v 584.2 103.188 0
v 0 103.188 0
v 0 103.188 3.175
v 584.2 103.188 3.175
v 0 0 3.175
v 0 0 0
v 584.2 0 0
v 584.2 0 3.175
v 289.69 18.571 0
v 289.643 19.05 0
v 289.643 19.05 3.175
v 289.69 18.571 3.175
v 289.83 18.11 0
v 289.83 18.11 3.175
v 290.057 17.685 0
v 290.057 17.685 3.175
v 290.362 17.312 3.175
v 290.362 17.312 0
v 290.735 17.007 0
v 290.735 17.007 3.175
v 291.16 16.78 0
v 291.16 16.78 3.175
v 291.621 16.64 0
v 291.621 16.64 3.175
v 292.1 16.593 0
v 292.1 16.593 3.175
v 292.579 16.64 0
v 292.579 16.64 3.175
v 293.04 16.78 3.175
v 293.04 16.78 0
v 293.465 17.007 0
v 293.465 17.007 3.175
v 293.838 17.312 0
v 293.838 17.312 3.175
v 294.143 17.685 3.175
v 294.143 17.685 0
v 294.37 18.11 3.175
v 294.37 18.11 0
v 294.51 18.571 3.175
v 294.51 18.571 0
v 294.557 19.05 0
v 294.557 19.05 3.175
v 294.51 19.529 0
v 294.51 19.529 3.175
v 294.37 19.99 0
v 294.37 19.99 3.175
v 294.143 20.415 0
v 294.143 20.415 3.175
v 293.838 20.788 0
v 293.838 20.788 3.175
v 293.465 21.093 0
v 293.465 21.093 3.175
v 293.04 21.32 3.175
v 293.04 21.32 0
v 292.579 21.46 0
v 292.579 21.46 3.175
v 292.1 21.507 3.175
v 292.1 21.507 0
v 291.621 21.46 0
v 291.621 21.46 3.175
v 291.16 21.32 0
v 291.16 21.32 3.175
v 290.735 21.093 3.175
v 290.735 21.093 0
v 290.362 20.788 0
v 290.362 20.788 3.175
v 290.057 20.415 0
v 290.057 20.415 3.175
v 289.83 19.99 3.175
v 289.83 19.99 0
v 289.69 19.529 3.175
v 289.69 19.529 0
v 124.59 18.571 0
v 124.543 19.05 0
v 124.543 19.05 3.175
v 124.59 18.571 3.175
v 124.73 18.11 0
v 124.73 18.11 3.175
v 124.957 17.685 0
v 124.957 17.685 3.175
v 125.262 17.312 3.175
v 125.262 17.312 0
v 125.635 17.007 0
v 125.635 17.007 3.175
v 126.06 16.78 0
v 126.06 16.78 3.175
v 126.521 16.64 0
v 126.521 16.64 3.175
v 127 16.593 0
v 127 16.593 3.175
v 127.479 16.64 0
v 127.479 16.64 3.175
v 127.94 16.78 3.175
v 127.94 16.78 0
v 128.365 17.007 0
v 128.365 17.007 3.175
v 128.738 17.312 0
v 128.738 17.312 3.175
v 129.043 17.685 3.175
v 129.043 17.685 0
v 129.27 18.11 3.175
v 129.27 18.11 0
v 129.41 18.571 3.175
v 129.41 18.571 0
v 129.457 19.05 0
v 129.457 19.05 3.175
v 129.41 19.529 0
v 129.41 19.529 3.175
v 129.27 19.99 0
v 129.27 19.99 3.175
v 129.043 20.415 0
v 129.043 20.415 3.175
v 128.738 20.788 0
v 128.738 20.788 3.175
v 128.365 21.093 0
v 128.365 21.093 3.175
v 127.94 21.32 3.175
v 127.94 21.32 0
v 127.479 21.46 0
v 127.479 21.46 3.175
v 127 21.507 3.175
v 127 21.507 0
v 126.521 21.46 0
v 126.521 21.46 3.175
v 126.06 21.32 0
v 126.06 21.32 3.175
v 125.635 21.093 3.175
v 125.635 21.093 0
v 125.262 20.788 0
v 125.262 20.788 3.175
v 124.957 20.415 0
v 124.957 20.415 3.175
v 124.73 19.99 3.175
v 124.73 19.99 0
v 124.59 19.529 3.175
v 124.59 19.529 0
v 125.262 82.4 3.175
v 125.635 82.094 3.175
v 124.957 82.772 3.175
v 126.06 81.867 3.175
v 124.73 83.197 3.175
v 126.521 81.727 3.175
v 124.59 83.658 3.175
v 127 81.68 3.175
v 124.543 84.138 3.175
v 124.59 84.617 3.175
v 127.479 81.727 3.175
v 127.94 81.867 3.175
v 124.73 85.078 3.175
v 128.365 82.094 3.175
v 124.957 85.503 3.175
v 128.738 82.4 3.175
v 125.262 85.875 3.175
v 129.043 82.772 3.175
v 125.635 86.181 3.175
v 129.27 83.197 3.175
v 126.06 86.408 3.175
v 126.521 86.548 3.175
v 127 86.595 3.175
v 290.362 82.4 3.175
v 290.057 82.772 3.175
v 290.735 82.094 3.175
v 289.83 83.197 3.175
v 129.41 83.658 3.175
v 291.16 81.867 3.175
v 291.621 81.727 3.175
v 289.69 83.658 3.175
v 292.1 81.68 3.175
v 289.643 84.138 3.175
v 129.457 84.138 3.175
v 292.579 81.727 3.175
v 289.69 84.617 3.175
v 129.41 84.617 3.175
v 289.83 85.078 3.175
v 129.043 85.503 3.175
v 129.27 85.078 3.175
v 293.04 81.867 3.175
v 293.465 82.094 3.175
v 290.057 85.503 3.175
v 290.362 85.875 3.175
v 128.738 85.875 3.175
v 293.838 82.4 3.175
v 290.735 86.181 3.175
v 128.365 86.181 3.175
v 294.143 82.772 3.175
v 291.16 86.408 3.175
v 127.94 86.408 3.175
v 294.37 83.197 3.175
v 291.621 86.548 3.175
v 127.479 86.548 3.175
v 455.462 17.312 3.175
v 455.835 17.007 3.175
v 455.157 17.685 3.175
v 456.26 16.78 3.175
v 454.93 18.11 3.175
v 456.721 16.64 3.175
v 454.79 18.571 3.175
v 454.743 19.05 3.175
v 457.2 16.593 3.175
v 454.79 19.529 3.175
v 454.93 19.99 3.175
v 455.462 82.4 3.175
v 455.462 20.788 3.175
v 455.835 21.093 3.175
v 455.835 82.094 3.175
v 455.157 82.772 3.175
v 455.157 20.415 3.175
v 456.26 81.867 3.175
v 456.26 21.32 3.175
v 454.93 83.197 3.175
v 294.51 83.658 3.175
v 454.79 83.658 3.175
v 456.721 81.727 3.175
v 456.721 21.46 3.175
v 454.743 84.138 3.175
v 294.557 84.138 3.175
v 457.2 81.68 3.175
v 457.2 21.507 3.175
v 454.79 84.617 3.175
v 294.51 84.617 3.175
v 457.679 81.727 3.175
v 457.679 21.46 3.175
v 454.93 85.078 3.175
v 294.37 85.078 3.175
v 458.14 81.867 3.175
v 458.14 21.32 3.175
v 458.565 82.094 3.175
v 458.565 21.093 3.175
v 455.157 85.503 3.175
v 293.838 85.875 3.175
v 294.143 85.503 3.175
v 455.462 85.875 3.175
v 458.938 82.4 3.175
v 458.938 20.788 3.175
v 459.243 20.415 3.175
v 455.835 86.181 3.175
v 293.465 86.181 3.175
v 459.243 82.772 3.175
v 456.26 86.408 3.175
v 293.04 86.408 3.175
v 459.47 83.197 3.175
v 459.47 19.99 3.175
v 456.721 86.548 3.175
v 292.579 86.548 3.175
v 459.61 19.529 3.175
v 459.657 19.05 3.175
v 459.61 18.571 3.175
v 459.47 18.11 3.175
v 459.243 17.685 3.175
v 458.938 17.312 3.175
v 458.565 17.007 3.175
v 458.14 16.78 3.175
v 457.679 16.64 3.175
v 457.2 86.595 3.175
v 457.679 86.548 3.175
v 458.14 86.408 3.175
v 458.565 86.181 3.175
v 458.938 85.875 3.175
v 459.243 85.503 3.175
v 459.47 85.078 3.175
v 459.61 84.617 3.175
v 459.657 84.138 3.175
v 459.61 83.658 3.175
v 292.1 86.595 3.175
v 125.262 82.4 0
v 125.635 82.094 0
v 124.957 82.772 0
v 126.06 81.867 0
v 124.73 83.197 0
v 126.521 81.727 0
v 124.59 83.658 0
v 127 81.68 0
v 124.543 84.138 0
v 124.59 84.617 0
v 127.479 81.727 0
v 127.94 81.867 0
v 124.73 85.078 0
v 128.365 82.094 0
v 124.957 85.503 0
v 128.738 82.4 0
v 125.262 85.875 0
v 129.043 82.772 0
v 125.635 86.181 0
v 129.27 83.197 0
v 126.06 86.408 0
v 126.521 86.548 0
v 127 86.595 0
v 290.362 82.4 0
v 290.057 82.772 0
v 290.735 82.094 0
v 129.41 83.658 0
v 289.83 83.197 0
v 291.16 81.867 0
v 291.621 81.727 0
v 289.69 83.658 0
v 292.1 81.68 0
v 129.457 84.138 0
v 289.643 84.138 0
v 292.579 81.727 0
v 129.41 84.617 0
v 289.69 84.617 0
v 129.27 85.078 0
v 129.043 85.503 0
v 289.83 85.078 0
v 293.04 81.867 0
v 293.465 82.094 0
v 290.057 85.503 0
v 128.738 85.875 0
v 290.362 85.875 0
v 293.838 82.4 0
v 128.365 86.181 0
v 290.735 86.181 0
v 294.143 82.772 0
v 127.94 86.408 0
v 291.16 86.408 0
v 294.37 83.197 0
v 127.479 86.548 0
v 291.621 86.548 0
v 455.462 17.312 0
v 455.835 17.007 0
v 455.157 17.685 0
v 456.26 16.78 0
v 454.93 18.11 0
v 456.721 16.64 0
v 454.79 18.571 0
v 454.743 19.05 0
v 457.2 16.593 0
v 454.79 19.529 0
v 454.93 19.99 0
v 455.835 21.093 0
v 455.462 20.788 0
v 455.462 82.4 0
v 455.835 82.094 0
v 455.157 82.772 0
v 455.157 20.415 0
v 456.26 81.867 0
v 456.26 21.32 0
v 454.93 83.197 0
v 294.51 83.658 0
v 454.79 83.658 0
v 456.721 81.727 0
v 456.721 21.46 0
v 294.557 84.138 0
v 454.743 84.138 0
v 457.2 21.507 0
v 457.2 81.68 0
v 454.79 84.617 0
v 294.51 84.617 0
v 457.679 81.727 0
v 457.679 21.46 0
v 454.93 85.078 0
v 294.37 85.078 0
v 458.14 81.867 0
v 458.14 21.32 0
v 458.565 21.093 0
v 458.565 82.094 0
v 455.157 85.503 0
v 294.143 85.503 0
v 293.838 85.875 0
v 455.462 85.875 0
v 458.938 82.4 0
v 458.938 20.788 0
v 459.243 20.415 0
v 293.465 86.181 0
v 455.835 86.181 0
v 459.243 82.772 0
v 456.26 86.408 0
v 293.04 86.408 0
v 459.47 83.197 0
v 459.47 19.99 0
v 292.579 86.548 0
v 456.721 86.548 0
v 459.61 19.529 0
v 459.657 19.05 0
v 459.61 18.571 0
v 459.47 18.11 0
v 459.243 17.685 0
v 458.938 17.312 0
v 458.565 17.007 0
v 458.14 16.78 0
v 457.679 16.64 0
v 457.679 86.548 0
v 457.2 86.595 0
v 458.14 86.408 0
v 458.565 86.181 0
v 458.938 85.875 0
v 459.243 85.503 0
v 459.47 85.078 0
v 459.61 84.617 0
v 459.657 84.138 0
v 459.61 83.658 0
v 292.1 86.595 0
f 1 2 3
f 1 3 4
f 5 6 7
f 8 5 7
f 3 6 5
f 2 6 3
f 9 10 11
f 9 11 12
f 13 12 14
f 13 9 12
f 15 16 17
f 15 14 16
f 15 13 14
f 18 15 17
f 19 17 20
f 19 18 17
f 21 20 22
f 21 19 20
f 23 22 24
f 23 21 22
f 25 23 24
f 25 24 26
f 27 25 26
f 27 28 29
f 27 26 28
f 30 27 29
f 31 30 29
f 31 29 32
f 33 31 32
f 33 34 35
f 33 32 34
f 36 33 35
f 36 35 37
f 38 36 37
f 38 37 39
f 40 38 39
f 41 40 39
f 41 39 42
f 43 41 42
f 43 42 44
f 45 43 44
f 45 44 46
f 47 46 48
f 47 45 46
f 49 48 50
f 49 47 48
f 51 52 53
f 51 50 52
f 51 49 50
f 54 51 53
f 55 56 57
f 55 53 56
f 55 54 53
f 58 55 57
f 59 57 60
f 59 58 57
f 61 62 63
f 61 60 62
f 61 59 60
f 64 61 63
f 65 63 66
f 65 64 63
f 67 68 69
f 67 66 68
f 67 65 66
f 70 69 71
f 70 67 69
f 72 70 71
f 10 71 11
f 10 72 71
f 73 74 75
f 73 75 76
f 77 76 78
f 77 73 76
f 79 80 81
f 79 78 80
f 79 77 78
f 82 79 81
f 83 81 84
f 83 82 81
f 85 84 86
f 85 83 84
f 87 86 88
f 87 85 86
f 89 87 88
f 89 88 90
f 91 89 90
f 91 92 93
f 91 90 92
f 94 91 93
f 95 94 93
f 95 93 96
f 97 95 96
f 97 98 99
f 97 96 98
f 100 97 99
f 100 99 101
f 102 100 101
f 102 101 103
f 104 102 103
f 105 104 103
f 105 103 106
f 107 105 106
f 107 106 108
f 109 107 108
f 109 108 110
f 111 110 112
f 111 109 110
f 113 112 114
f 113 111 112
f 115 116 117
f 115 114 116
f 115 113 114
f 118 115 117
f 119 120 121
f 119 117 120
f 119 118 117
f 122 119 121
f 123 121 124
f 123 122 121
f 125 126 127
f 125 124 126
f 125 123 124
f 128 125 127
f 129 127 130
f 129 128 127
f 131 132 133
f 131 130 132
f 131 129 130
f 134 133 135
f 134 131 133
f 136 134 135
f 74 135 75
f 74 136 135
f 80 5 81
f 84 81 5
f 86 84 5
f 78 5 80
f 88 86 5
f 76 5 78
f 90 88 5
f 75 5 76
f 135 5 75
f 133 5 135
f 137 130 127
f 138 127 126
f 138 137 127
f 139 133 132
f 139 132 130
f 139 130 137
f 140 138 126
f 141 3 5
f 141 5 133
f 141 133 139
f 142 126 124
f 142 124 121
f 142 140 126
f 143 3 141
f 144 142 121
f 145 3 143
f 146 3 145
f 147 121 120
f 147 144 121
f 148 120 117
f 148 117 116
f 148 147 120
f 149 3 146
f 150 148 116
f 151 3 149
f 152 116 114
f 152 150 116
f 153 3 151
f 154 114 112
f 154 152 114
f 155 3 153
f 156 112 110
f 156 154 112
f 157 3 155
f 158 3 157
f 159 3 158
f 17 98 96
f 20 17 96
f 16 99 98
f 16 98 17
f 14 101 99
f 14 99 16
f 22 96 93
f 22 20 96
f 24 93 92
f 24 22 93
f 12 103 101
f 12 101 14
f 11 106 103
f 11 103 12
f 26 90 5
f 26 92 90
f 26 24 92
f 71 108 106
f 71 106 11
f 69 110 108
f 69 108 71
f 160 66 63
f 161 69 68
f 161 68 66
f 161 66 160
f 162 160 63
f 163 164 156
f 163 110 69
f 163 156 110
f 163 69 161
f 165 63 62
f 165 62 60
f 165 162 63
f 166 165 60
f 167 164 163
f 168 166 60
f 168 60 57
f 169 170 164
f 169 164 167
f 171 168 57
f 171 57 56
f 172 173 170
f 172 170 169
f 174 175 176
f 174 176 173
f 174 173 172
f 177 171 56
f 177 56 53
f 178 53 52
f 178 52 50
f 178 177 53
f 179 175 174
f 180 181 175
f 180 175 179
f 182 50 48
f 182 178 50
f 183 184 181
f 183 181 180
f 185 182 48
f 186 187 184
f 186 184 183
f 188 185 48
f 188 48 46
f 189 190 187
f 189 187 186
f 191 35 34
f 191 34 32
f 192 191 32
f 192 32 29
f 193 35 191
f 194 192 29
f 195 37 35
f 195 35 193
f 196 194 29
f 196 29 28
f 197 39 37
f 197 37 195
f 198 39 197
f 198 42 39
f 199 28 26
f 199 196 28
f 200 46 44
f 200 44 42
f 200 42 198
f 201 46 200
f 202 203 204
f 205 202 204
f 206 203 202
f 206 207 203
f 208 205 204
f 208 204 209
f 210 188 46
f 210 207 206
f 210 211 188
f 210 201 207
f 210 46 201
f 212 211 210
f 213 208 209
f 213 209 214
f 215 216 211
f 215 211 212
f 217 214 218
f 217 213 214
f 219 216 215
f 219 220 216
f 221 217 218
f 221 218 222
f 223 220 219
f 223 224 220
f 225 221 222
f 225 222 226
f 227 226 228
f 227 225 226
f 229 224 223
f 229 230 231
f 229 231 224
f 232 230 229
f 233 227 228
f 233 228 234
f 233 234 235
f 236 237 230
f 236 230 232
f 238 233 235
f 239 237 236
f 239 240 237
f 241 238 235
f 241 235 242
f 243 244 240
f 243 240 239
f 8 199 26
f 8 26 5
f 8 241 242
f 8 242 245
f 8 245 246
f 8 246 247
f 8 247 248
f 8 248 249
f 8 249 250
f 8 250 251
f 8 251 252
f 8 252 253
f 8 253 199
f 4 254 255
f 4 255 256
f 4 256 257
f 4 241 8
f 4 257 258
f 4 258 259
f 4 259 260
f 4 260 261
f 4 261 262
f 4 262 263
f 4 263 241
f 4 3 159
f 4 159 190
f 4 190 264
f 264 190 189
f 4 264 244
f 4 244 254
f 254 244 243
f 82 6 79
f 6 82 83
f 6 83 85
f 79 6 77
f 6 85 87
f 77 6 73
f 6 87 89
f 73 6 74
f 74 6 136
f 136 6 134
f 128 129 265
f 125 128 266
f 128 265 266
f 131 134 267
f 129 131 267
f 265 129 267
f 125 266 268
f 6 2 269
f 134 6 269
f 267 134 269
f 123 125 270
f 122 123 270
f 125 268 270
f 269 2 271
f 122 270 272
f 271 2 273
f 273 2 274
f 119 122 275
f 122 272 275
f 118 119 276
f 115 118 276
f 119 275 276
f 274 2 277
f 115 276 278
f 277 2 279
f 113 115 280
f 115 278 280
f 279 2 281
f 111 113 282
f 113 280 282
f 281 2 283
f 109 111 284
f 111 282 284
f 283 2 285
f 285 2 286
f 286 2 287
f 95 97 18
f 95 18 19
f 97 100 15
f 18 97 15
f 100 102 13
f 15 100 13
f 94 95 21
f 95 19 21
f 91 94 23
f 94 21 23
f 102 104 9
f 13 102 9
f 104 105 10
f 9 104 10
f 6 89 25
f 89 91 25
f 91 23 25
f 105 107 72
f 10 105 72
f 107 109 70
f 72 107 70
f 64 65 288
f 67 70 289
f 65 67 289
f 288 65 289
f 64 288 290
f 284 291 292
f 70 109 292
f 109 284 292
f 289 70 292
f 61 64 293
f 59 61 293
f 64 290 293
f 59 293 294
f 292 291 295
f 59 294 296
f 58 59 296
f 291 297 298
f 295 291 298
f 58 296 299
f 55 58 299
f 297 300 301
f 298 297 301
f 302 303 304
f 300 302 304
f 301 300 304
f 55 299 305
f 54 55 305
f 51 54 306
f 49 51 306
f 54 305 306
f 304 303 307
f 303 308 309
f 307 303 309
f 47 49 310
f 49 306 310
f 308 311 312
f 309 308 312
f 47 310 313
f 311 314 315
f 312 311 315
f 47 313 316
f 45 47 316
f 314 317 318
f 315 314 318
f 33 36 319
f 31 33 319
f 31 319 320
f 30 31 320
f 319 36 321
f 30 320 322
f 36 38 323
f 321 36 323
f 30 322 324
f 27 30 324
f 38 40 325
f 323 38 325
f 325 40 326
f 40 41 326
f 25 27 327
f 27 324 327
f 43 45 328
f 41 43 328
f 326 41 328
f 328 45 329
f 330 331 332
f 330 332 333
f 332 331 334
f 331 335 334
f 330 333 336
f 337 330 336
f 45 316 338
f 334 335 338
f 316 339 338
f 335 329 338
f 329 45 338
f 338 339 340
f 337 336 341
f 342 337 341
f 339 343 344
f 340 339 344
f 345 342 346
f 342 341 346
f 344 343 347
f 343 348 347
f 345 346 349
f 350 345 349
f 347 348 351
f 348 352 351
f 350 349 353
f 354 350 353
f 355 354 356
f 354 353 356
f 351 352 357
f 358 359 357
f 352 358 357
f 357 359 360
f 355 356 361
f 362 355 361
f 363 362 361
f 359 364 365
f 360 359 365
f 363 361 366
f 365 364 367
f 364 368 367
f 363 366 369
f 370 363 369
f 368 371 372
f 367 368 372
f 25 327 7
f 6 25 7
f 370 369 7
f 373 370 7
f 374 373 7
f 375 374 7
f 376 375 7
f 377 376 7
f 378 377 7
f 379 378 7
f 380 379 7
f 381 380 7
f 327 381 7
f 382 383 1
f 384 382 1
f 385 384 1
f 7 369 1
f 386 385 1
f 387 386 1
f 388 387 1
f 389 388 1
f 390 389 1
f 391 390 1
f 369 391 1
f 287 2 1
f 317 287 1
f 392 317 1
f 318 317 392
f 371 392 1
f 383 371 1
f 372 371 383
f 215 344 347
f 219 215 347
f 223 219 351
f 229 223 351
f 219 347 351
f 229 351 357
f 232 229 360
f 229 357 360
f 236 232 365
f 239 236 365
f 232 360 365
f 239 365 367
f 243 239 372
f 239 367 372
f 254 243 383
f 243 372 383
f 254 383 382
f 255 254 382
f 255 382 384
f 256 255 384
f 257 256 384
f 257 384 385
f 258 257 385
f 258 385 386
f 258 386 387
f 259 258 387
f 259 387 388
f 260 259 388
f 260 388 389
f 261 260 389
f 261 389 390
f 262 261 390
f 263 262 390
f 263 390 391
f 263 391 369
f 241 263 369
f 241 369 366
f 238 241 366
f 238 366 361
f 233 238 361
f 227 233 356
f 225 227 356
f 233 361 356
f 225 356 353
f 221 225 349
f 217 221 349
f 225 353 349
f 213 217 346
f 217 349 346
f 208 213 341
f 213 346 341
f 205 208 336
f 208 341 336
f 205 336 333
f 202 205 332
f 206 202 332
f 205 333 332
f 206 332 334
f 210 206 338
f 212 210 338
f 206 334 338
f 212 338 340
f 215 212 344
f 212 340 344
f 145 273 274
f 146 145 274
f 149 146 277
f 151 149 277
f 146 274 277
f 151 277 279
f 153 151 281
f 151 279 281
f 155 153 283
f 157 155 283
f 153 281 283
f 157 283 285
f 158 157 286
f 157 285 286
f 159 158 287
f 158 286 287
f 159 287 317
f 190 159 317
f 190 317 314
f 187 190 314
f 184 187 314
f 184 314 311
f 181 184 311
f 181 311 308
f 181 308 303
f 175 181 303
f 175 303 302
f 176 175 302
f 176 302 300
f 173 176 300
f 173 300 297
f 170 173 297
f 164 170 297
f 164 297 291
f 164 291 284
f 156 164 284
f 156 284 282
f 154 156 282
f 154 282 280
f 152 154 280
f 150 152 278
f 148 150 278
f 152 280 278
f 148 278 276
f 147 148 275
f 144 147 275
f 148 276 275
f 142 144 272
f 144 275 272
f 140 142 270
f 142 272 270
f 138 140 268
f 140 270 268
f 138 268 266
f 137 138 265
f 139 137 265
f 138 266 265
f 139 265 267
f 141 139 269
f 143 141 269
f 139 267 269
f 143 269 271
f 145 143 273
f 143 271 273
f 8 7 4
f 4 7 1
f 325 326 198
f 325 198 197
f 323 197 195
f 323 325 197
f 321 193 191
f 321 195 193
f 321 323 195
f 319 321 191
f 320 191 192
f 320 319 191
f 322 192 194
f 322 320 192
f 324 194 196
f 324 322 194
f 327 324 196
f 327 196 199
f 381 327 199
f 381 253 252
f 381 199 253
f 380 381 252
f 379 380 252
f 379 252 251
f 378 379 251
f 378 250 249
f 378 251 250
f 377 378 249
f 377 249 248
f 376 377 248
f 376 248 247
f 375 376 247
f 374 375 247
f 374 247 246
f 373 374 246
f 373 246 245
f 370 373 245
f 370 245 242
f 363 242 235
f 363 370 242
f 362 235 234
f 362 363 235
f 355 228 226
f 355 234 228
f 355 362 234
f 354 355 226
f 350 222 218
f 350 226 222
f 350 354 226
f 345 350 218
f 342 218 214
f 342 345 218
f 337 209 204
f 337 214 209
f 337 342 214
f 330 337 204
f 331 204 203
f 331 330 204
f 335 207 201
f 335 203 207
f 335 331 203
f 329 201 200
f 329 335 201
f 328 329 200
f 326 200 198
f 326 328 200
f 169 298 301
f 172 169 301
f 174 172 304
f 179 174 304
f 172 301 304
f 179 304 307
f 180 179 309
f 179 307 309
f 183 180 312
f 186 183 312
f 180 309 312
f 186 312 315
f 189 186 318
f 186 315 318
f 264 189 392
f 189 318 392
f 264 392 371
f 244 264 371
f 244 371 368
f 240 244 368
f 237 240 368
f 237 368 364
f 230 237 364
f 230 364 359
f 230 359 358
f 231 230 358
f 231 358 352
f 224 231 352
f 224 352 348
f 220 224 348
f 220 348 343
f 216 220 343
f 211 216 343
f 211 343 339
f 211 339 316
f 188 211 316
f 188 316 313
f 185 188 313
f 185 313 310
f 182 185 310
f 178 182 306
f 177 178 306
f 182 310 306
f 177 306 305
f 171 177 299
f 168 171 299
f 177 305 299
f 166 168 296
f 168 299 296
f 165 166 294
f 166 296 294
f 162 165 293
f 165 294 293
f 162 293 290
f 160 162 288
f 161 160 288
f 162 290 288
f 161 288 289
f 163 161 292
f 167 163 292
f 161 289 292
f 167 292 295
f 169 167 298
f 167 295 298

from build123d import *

# Parameters (mm, degrees)
SKETCH2_W                    = 584.2
SKETCH2_H                    = 103.1875
BOSS_EXTRUDE1_DEPTH          = 3.175
F_10_0_1935_DIAMETER_HOLE1_D = 4.9149


with BuildPart() as part:
    # Sketch2 → Boss-Extrude1 (new body)
    with BuildSketch(Plane.XY):
        with Locations((292.1, 51.59375)):
            Rectangle(SKETCH2_W, SKETCH2_H)
    extrude(amount=BOSS_EXTRUDE1_DEPTH)

    # #10 (0.1935) Diameter Hole1 (through all)
    with Locations(Plane.XY.offset(3.175)):
        with Locations((127, 84.1375), (292.1, 84.1375), (457.2, 84.1375)):
            f_10_0_1935_diameter_hole1 = Hole(F_10_0_1935_DIAMETER_HOLE1_D / 2)

    # Mirror1: #10 (0.1935) Diameter Hole1 across plane
    add(f_10_0_1935_diameter_hole1.mirror(Plane.ZX.offset(51.59375)), mode=Mode.SUBTRACT)


solid = part.part
